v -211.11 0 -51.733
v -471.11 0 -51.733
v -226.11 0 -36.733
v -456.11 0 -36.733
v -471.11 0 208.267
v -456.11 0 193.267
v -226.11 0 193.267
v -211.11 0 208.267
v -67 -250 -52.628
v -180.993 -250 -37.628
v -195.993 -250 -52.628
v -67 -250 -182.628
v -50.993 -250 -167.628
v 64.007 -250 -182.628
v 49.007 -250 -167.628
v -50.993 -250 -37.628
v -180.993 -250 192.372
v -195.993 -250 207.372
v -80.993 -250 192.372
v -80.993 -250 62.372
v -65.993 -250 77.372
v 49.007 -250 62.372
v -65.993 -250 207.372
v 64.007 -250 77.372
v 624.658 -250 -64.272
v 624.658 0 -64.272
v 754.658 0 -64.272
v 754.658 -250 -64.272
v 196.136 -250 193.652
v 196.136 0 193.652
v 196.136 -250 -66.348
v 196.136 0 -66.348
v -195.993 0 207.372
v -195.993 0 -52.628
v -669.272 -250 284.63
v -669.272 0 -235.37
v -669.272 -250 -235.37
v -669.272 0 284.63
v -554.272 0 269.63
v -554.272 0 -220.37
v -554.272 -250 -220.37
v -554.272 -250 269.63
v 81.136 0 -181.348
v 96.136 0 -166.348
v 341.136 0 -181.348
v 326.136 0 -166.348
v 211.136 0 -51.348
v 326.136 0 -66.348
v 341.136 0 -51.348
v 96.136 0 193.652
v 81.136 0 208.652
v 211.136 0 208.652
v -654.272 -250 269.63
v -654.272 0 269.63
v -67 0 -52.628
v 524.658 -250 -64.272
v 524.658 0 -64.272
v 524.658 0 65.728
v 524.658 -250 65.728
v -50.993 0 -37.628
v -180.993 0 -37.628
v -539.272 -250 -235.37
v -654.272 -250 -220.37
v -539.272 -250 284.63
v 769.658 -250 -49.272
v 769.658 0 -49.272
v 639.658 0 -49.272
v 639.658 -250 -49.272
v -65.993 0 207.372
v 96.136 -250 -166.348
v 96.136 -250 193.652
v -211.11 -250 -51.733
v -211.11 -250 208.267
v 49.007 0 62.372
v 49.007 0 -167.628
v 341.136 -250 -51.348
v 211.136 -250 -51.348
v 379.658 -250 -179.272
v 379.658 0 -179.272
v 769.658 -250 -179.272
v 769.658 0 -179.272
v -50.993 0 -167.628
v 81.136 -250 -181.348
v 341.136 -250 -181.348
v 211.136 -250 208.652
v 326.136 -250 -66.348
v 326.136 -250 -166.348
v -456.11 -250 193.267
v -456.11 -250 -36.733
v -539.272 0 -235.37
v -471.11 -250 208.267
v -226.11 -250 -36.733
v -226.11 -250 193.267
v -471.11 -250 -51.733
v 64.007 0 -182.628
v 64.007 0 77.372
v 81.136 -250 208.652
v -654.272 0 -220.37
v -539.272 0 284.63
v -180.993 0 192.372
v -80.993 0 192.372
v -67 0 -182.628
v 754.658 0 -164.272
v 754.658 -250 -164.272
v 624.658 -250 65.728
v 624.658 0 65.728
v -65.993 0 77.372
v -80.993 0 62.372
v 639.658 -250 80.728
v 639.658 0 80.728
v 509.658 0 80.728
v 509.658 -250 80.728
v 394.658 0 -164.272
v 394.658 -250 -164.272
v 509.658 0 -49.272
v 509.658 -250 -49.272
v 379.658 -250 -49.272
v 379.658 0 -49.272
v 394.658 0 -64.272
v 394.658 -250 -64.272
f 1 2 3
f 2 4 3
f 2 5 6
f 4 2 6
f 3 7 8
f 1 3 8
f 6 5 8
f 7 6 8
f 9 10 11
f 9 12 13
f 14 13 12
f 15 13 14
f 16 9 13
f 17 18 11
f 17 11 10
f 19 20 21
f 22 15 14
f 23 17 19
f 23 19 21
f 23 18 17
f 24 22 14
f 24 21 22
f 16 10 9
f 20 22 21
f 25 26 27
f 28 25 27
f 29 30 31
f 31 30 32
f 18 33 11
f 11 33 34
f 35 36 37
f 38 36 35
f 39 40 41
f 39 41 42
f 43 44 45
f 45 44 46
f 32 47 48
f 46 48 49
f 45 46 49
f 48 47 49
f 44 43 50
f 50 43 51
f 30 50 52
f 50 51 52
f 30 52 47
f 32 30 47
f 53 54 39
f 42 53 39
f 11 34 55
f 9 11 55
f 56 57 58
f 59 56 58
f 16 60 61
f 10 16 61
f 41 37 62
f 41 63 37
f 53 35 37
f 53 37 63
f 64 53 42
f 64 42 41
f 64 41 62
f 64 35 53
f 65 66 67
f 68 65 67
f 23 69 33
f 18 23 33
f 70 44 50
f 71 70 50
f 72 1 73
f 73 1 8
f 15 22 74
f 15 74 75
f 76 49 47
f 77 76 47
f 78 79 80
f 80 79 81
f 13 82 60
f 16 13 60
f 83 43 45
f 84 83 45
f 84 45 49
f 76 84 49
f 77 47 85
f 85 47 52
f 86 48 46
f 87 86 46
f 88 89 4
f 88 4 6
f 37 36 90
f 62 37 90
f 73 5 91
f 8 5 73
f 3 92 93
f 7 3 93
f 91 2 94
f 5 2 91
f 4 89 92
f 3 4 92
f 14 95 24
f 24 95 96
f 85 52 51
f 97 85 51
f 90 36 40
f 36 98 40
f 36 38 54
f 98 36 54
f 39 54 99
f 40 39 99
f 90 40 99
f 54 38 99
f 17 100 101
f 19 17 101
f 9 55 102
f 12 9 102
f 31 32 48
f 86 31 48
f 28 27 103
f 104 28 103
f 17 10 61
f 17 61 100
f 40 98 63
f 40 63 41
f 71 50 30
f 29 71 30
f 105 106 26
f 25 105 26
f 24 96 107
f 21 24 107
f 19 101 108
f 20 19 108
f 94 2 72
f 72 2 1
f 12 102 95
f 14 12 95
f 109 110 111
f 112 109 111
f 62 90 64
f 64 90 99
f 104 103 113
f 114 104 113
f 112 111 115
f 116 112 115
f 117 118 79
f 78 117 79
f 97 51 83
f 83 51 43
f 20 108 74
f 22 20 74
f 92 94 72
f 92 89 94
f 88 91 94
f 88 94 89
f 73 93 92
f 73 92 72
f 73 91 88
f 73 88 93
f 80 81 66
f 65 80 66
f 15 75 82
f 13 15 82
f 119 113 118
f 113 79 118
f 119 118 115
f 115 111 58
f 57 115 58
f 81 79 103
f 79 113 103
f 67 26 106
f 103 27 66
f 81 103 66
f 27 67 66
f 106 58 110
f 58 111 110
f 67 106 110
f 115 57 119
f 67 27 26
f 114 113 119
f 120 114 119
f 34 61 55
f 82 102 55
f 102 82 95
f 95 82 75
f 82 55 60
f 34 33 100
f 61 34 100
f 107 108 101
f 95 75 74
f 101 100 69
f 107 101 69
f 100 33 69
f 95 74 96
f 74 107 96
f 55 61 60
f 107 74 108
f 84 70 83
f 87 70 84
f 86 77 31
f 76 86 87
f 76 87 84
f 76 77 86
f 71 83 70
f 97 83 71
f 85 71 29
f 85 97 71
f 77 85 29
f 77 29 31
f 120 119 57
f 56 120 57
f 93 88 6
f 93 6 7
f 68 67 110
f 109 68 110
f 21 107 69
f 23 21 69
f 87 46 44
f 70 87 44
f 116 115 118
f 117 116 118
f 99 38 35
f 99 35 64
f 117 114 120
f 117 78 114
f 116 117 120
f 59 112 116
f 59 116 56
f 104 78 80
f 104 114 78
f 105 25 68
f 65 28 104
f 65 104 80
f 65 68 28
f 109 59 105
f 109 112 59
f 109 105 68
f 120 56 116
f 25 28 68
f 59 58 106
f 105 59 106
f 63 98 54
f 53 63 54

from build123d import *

# Parameters (mm, degrees)
F5_DEPTH = 250
F6_DEPTH = 250
F7_DEPTH = 250
F3_W     = 130
F3_H     = 520
F3_W_2   = 100
F3_H_2   = 490
F8_DEPTH = 250
F1_W     = 260
F1_H     = 260
F1_W_2   = 230
F1_H_2   = 230
F9_DEPTH = 250


with BuildPart() as f5:
    # F2 (on Front) → F5 (new body)
    with BuildSketch(Plane.XZ):
        Polygon((211.136405, 208.652004), (81.136405, 208.652004), (81.136405, -181.347996), (341.136405, -181.347996), (341.136405, -51.347996), (211.136405, -51.347996), align=None)
        Polygon((96.136405, -166.347996), (96.136405, 193.652004), (196.136405, 193.652004), (196.136405, -66.347996), (326.136405, -66.347996), (326.136405, -166.347996), align=None, mode=Mode.SUBTRACT)
    extrude(amount=F5_DEPTH)


with BuildPart() as f6:
    # F4 (on Front) → F6 (new body)
    with BuildSketch(Plane.XZ):
        Polygon((509.657894, -49.271648), (379.657894, -49.271648), (379.657894, -179.271648), (769.657894, -179.271648), (769.657894, -49.271648), (639.657894, -49.271648), (639.657894, 80.728352), (509.657894, 80.728352), align=None)
        Polygon((524.657894, -64.271648), (524.657894, 65.728352), (624.657894, 65.728352), (624.657894, -64.271648), (754.657894, -64.271648), (754.657894, -164.271648), (394.657894, -164.271648), (394.657894, -64.271648), align=None, mode=Mode.SUBTRACT)
    extrude(amount=F6_DEPTH)


with BuildPart() as f7:
    # F0 (on Front) → F7 (new body)
    with BuildSketch(Plane.XZ):
        Polygon((-65.992579, 207.371857), (-195.992579, 207.371857), (-195.992579, -52.628143), (-67.000002, -52.628143), (-67.000002, -182.628143), (64.007421, -182.628143), (64.007421, 77.371857), (-65.992579, 77.371857), align=None)
        Polygon((-180.992579, -37.628143), (-180.992579, 192.371857), (-80.992579, 192.371857), (-80.992579, 62.371857), (49.007421, 62.371857), (49.007421, -167.628143), (-50.992579, -167.628143), (-50.992579, -37.628143), align=None, mode=Mode.SUBTRACT)
    extrude(amount=F7_DEPTH)


with BuildPart() as f8:
    # F3 (on Front) → F8 (new body)
    with BuildSketch(Plane.XZ):
        with Locations((-604.272395, 24.629812)):
            Rectangle(F3_W, F3_H)
        with Locations((-604.272395, 24.629812)):
            Rectangle(F3_W_2, F3_H_2, mode=Mode.SUBTRACT)
    extrude(amount=F8_DEPTH)


with BuildPart() as f9:
    # F1 (on Front) → F9 (new body)
    with BuildSketch(Plane.XZ):
        with Locations((-341.110463, 78.26707)):
            Rectangle(F1_W, F1_H)
        with Locations((-341.110463, 78.26707)):
            Rectangle(F1_W_2, F1_H_2, mode=Mode.SUBTRACT)
    extrude(amount=F9_DEPTH)


solid = Compound([f5.part, f6.part, f7.part, f8.part, f9.part])
